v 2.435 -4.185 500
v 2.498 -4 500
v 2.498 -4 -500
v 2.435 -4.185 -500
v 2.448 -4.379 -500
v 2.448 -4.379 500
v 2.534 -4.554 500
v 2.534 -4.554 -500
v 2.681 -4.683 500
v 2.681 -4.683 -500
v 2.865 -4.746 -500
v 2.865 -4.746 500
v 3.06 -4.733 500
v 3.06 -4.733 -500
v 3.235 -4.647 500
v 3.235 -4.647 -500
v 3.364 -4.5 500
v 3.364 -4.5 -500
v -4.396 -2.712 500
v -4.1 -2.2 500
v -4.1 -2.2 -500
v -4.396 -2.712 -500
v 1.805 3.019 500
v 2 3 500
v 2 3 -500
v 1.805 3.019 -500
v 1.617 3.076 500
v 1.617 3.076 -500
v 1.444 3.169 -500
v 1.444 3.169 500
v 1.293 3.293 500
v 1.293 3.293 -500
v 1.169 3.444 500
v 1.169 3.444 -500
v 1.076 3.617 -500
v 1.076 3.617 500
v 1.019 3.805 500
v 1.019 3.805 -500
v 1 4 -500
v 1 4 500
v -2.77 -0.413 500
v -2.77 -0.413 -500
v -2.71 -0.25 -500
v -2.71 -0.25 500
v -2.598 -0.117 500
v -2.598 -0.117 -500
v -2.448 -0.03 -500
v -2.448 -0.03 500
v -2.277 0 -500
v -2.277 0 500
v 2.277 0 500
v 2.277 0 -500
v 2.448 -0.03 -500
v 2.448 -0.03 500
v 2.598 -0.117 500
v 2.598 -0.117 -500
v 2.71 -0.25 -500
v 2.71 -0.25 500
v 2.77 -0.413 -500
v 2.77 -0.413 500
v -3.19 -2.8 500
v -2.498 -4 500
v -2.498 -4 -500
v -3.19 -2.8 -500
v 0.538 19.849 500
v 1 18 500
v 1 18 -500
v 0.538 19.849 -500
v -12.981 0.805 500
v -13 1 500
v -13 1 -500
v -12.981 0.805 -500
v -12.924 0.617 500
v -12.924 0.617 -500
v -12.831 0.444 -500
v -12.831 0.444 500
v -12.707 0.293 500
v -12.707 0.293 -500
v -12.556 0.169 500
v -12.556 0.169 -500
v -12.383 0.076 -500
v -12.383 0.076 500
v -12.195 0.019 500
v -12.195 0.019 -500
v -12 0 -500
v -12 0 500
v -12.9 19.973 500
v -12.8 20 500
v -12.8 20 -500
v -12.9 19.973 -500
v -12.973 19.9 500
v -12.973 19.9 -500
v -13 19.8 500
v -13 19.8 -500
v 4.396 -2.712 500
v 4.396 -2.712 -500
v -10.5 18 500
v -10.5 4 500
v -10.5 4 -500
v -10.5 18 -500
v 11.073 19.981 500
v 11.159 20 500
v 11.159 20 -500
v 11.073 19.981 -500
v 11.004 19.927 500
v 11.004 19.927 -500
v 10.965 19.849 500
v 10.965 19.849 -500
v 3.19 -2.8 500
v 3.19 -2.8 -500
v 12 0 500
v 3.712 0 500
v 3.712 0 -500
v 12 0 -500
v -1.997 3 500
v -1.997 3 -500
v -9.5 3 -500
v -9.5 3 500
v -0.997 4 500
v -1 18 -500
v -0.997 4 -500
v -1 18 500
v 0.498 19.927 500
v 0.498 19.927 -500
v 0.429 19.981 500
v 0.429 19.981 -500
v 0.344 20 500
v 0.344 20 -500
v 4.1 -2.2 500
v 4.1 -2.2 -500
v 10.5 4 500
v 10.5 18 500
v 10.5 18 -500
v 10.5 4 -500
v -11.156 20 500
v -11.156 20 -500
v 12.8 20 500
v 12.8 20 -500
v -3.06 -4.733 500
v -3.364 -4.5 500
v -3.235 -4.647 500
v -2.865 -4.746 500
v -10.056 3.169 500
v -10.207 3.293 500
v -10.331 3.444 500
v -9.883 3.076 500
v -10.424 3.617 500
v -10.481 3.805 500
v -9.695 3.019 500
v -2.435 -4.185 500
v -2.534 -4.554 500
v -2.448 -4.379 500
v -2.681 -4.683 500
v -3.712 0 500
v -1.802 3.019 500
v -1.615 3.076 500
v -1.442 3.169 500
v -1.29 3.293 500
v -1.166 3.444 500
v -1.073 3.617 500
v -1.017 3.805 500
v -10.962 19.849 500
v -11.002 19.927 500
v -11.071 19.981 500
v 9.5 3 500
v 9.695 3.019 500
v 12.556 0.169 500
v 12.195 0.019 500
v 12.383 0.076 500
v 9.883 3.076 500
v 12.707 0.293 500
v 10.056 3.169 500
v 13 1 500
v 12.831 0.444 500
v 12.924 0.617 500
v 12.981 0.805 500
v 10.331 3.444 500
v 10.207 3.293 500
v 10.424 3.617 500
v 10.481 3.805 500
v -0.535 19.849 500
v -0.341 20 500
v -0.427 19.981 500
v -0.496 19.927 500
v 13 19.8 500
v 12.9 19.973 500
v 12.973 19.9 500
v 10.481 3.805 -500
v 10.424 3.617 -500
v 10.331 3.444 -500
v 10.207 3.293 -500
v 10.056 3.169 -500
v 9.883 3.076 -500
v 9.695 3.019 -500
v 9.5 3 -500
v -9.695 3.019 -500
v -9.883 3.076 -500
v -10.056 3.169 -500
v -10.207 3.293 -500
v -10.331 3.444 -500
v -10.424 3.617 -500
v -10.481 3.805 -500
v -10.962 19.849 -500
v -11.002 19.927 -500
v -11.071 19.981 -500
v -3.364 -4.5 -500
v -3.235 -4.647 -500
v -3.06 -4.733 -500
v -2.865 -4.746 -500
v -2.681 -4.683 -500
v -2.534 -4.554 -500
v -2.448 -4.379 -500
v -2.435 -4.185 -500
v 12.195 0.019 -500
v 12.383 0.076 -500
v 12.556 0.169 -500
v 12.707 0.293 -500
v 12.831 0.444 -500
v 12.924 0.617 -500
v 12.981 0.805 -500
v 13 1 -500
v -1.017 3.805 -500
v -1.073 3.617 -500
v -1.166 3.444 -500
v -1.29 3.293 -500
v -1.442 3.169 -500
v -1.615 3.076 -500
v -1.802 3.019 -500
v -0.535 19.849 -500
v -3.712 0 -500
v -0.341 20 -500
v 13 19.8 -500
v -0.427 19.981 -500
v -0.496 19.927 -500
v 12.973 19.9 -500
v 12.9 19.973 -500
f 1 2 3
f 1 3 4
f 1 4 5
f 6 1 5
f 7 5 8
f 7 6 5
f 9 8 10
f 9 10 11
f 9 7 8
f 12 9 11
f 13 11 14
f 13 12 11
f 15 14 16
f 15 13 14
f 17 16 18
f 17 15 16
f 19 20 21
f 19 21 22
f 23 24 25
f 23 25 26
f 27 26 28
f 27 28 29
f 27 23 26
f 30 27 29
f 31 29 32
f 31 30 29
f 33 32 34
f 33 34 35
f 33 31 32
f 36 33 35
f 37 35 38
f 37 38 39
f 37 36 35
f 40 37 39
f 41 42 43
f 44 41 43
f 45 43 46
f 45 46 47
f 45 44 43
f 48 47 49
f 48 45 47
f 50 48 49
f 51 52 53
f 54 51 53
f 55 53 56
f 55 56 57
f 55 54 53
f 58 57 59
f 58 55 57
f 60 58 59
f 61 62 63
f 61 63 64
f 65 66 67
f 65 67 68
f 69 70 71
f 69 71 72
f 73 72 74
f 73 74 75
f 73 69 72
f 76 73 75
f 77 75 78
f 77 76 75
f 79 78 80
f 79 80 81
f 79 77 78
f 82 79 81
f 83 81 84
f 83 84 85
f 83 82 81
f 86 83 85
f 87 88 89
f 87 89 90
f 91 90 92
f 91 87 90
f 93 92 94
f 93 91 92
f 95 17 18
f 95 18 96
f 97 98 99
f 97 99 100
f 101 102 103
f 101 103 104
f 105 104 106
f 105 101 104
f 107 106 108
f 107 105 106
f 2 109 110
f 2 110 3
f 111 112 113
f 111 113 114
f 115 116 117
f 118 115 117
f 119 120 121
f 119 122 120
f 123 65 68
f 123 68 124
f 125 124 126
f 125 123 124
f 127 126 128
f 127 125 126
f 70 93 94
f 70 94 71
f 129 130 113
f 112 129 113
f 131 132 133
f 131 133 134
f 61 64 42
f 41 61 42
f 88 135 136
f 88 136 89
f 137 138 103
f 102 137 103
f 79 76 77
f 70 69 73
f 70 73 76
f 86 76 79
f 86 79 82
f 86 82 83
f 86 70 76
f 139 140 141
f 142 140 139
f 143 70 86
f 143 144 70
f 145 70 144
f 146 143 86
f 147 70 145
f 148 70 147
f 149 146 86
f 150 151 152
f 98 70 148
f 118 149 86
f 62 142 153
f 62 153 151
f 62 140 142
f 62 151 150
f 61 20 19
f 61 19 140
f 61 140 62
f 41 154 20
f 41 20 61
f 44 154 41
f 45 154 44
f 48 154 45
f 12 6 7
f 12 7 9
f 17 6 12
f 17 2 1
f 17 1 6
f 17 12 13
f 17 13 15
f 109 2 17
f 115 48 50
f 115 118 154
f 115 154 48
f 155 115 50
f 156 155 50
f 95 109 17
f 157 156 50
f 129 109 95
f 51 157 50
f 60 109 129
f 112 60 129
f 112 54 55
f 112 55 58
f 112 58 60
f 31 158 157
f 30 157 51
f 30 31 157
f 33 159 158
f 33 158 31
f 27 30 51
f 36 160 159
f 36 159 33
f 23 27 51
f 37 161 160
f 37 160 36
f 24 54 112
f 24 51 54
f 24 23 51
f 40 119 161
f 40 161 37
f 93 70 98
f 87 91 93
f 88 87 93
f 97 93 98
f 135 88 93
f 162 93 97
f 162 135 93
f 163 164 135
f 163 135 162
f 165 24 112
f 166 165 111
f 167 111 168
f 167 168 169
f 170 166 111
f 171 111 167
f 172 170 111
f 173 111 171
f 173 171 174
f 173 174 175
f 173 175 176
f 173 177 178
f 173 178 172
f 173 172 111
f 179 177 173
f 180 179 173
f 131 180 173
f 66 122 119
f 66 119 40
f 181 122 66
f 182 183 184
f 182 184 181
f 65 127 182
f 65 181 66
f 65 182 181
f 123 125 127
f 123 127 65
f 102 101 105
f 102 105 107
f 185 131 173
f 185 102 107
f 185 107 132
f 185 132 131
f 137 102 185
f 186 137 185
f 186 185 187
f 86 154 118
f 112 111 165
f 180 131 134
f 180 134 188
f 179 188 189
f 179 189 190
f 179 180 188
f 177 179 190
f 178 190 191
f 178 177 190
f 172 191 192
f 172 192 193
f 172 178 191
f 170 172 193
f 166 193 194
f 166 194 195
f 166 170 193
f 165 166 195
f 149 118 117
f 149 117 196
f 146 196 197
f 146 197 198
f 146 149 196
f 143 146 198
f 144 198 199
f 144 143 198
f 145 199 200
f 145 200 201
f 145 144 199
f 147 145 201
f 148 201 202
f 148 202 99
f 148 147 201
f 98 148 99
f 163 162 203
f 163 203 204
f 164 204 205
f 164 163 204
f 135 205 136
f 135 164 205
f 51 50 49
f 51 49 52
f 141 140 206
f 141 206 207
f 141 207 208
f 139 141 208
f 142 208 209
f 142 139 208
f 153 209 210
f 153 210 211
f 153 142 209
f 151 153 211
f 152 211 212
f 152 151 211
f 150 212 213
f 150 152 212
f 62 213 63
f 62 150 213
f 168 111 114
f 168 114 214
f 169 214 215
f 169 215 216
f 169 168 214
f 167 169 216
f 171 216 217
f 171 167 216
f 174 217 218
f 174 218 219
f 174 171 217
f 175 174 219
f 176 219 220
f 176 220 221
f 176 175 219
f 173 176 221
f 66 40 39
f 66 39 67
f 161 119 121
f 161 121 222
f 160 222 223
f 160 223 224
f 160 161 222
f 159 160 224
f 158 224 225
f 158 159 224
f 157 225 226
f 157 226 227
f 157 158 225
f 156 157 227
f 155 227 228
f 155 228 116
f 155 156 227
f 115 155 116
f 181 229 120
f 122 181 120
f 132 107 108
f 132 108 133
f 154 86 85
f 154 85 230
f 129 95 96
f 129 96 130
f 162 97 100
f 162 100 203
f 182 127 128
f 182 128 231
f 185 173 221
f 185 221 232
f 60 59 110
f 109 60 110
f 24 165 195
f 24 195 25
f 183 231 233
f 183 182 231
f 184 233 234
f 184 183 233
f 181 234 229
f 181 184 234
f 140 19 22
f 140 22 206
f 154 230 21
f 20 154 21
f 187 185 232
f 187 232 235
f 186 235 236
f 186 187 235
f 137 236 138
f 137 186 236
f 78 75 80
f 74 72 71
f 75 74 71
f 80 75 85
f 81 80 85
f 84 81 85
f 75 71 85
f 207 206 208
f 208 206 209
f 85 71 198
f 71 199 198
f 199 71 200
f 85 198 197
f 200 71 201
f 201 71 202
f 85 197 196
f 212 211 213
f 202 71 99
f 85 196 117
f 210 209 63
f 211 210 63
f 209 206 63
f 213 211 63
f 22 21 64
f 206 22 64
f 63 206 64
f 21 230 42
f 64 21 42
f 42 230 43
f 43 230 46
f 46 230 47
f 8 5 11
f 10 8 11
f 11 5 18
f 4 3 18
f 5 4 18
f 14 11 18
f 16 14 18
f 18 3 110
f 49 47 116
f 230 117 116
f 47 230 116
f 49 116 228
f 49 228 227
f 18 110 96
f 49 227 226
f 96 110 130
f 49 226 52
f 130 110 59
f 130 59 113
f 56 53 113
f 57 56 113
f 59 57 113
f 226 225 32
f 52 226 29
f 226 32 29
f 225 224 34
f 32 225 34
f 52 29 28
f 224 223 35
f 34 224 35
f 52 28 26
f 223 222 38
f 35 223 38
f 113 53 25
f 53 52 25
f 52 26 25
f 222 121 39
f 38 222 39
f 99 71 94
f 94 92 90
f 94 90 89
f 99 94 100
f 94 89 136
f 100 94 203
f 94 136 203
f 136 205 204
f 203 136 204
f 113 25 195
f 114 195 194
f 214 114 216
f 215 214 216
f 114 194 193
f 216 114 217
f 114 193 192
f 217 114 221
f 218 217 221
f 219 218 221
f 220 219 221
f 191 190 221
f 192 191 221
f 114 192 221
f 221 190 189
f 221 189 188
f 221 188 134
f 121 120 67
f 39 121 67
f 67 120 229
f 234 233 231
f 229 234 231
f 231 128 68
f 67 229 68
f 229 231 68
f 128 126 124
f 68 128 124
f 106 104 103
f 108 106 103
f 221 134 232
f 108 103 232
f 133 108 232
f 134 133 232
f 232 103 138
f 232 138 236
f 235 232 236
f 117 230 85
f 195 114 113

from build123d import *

# Parameters (mm, degrees)
EXTRUDE_1_DEPTH = 500


with BuildPart() as part:
    # 草图9 → 拉伸1 (new body, symmetric)
    with BuildSketch(Plane.XY):
        with BuildLine():
            Line((-1, 18), (-0.997378521, 4))
            ThreePointArc((-0.997378521, 4), (-1.29027174, 3.292893219), (-1.997378521, 3))
            Line((-1.997378521, 3), (-9.5, 3))
            ThreePointArc((-9.5, 3), (-10.207106781, 3.292893219), (-10.5, 4))
            Line((-10.5, 4), (-10.5, 18))
            Line((-10.5, 18), (-10.962126781, 19.848507125))
            ThreePointArc((-10.962126781, 19.848507125), (-11.033072839, 19.957641088), (-11.156155281, 20))
            Line((-11.156155281, 20), (-12.8, 20))
            ThreePointArc((-12.8, 20), (-12.941421356, 19.941421356), (-13, 19.8))
            Line((-13, 19.8), (-13, 1))
            ThreePointArc((-13, 1), (-12.707106781, 0.292893219), (-12, 0))
            Line((-12, 0), (-3.712080642, 0))
            Line((-3.712080642, 0), (-4.1, -2.2))
            Line((-4.1, -2.2), (-4.395740138, -2.712236945))
            Line((-4.395740138, -2.712236945), (-3.363574657, -4.5))
            ThreePointArc((-3.363574657, -4.5), (-2.680561955, -4.683012702), (-2.497549254, -4))
            Line((-2.497549254, -4), (-3.190369577, -2.8))
            Line((-3.190369577, -2.8), (-2.769508091, -0.413175911))
            ThreePointArc((-2.769508091, -0.413175911), (-2.59849802, -0.116977778), (-2.277104215, 0))
            Line((-2.277104215, 0), (2.277104215, 0))
            ThreePointArc((2.277104215, 0), (2.59849802, -0.116977778), (2.769508091, -0.413175911))
            Line((2.769508091, -0.413175911), (3.190369577, -2.8))
            Line((3.190369577, -2.8), (2.497549254, -4))
            ThreePointArc((2.497549254, -4), (2.680561955, -4.683012702), (3.363574657, -4.5))
            Line((3.363574657, -4.5), (4.395740138, -2.712236945))
            Line((4.395740138, -2.712236945), (4.1, -2.2))
            Line((4.1, -2.2), (3.712080642, 0))
            Line((3.712080642, 0), (12, 0))
            ThreePointArc((12, 0), (12.707106781, 0.292893219), (13, 1))
            Line((13, 1), (13, 19.8))
            ThreePointArc((13, 19.8), (12.941421356, 19.941421356), (12.8, 20))
            Line((12.8, 20), (11.158776943, 20))
            ThreePointArc((11.158776943, 20), (11.035799699, 19.957723167), (10.964813339, 19.848765973))
            Line((10.964813339, 19.848765973), (10.5, 18))
            Line((10.5, 18), (10.5, 4))
            ThreePointArc((10.5, 4), (10.207106781, 3.292893219), (9.5, 3))
            Line((9.5, 3), (2, 3))
            ThreePointArc((2, 3), (1.292893219, 3.292893219), (1, 4))
            Line((1, 4), (1, 18))
            Line((1, 18), (0.537873219, 19.848507125))
            ThreePointArc((0.537873219, 19.848507125), (0.466927161, 19.957641088), (0.343844719, 20))
            Line((0.343844719, 20), (-0.34122324, 20))
            ThreePointArc((-0.34122324, 20), (-0.464305682, 19.957641088), (-0.53525174, 19.848507125))
            Line((-0.53525174, 19.848507125), (-1, 18))
        make_face()
    extrude(amount=EXTRUDE_1_DEPTH, both=True)


solid = part.part
